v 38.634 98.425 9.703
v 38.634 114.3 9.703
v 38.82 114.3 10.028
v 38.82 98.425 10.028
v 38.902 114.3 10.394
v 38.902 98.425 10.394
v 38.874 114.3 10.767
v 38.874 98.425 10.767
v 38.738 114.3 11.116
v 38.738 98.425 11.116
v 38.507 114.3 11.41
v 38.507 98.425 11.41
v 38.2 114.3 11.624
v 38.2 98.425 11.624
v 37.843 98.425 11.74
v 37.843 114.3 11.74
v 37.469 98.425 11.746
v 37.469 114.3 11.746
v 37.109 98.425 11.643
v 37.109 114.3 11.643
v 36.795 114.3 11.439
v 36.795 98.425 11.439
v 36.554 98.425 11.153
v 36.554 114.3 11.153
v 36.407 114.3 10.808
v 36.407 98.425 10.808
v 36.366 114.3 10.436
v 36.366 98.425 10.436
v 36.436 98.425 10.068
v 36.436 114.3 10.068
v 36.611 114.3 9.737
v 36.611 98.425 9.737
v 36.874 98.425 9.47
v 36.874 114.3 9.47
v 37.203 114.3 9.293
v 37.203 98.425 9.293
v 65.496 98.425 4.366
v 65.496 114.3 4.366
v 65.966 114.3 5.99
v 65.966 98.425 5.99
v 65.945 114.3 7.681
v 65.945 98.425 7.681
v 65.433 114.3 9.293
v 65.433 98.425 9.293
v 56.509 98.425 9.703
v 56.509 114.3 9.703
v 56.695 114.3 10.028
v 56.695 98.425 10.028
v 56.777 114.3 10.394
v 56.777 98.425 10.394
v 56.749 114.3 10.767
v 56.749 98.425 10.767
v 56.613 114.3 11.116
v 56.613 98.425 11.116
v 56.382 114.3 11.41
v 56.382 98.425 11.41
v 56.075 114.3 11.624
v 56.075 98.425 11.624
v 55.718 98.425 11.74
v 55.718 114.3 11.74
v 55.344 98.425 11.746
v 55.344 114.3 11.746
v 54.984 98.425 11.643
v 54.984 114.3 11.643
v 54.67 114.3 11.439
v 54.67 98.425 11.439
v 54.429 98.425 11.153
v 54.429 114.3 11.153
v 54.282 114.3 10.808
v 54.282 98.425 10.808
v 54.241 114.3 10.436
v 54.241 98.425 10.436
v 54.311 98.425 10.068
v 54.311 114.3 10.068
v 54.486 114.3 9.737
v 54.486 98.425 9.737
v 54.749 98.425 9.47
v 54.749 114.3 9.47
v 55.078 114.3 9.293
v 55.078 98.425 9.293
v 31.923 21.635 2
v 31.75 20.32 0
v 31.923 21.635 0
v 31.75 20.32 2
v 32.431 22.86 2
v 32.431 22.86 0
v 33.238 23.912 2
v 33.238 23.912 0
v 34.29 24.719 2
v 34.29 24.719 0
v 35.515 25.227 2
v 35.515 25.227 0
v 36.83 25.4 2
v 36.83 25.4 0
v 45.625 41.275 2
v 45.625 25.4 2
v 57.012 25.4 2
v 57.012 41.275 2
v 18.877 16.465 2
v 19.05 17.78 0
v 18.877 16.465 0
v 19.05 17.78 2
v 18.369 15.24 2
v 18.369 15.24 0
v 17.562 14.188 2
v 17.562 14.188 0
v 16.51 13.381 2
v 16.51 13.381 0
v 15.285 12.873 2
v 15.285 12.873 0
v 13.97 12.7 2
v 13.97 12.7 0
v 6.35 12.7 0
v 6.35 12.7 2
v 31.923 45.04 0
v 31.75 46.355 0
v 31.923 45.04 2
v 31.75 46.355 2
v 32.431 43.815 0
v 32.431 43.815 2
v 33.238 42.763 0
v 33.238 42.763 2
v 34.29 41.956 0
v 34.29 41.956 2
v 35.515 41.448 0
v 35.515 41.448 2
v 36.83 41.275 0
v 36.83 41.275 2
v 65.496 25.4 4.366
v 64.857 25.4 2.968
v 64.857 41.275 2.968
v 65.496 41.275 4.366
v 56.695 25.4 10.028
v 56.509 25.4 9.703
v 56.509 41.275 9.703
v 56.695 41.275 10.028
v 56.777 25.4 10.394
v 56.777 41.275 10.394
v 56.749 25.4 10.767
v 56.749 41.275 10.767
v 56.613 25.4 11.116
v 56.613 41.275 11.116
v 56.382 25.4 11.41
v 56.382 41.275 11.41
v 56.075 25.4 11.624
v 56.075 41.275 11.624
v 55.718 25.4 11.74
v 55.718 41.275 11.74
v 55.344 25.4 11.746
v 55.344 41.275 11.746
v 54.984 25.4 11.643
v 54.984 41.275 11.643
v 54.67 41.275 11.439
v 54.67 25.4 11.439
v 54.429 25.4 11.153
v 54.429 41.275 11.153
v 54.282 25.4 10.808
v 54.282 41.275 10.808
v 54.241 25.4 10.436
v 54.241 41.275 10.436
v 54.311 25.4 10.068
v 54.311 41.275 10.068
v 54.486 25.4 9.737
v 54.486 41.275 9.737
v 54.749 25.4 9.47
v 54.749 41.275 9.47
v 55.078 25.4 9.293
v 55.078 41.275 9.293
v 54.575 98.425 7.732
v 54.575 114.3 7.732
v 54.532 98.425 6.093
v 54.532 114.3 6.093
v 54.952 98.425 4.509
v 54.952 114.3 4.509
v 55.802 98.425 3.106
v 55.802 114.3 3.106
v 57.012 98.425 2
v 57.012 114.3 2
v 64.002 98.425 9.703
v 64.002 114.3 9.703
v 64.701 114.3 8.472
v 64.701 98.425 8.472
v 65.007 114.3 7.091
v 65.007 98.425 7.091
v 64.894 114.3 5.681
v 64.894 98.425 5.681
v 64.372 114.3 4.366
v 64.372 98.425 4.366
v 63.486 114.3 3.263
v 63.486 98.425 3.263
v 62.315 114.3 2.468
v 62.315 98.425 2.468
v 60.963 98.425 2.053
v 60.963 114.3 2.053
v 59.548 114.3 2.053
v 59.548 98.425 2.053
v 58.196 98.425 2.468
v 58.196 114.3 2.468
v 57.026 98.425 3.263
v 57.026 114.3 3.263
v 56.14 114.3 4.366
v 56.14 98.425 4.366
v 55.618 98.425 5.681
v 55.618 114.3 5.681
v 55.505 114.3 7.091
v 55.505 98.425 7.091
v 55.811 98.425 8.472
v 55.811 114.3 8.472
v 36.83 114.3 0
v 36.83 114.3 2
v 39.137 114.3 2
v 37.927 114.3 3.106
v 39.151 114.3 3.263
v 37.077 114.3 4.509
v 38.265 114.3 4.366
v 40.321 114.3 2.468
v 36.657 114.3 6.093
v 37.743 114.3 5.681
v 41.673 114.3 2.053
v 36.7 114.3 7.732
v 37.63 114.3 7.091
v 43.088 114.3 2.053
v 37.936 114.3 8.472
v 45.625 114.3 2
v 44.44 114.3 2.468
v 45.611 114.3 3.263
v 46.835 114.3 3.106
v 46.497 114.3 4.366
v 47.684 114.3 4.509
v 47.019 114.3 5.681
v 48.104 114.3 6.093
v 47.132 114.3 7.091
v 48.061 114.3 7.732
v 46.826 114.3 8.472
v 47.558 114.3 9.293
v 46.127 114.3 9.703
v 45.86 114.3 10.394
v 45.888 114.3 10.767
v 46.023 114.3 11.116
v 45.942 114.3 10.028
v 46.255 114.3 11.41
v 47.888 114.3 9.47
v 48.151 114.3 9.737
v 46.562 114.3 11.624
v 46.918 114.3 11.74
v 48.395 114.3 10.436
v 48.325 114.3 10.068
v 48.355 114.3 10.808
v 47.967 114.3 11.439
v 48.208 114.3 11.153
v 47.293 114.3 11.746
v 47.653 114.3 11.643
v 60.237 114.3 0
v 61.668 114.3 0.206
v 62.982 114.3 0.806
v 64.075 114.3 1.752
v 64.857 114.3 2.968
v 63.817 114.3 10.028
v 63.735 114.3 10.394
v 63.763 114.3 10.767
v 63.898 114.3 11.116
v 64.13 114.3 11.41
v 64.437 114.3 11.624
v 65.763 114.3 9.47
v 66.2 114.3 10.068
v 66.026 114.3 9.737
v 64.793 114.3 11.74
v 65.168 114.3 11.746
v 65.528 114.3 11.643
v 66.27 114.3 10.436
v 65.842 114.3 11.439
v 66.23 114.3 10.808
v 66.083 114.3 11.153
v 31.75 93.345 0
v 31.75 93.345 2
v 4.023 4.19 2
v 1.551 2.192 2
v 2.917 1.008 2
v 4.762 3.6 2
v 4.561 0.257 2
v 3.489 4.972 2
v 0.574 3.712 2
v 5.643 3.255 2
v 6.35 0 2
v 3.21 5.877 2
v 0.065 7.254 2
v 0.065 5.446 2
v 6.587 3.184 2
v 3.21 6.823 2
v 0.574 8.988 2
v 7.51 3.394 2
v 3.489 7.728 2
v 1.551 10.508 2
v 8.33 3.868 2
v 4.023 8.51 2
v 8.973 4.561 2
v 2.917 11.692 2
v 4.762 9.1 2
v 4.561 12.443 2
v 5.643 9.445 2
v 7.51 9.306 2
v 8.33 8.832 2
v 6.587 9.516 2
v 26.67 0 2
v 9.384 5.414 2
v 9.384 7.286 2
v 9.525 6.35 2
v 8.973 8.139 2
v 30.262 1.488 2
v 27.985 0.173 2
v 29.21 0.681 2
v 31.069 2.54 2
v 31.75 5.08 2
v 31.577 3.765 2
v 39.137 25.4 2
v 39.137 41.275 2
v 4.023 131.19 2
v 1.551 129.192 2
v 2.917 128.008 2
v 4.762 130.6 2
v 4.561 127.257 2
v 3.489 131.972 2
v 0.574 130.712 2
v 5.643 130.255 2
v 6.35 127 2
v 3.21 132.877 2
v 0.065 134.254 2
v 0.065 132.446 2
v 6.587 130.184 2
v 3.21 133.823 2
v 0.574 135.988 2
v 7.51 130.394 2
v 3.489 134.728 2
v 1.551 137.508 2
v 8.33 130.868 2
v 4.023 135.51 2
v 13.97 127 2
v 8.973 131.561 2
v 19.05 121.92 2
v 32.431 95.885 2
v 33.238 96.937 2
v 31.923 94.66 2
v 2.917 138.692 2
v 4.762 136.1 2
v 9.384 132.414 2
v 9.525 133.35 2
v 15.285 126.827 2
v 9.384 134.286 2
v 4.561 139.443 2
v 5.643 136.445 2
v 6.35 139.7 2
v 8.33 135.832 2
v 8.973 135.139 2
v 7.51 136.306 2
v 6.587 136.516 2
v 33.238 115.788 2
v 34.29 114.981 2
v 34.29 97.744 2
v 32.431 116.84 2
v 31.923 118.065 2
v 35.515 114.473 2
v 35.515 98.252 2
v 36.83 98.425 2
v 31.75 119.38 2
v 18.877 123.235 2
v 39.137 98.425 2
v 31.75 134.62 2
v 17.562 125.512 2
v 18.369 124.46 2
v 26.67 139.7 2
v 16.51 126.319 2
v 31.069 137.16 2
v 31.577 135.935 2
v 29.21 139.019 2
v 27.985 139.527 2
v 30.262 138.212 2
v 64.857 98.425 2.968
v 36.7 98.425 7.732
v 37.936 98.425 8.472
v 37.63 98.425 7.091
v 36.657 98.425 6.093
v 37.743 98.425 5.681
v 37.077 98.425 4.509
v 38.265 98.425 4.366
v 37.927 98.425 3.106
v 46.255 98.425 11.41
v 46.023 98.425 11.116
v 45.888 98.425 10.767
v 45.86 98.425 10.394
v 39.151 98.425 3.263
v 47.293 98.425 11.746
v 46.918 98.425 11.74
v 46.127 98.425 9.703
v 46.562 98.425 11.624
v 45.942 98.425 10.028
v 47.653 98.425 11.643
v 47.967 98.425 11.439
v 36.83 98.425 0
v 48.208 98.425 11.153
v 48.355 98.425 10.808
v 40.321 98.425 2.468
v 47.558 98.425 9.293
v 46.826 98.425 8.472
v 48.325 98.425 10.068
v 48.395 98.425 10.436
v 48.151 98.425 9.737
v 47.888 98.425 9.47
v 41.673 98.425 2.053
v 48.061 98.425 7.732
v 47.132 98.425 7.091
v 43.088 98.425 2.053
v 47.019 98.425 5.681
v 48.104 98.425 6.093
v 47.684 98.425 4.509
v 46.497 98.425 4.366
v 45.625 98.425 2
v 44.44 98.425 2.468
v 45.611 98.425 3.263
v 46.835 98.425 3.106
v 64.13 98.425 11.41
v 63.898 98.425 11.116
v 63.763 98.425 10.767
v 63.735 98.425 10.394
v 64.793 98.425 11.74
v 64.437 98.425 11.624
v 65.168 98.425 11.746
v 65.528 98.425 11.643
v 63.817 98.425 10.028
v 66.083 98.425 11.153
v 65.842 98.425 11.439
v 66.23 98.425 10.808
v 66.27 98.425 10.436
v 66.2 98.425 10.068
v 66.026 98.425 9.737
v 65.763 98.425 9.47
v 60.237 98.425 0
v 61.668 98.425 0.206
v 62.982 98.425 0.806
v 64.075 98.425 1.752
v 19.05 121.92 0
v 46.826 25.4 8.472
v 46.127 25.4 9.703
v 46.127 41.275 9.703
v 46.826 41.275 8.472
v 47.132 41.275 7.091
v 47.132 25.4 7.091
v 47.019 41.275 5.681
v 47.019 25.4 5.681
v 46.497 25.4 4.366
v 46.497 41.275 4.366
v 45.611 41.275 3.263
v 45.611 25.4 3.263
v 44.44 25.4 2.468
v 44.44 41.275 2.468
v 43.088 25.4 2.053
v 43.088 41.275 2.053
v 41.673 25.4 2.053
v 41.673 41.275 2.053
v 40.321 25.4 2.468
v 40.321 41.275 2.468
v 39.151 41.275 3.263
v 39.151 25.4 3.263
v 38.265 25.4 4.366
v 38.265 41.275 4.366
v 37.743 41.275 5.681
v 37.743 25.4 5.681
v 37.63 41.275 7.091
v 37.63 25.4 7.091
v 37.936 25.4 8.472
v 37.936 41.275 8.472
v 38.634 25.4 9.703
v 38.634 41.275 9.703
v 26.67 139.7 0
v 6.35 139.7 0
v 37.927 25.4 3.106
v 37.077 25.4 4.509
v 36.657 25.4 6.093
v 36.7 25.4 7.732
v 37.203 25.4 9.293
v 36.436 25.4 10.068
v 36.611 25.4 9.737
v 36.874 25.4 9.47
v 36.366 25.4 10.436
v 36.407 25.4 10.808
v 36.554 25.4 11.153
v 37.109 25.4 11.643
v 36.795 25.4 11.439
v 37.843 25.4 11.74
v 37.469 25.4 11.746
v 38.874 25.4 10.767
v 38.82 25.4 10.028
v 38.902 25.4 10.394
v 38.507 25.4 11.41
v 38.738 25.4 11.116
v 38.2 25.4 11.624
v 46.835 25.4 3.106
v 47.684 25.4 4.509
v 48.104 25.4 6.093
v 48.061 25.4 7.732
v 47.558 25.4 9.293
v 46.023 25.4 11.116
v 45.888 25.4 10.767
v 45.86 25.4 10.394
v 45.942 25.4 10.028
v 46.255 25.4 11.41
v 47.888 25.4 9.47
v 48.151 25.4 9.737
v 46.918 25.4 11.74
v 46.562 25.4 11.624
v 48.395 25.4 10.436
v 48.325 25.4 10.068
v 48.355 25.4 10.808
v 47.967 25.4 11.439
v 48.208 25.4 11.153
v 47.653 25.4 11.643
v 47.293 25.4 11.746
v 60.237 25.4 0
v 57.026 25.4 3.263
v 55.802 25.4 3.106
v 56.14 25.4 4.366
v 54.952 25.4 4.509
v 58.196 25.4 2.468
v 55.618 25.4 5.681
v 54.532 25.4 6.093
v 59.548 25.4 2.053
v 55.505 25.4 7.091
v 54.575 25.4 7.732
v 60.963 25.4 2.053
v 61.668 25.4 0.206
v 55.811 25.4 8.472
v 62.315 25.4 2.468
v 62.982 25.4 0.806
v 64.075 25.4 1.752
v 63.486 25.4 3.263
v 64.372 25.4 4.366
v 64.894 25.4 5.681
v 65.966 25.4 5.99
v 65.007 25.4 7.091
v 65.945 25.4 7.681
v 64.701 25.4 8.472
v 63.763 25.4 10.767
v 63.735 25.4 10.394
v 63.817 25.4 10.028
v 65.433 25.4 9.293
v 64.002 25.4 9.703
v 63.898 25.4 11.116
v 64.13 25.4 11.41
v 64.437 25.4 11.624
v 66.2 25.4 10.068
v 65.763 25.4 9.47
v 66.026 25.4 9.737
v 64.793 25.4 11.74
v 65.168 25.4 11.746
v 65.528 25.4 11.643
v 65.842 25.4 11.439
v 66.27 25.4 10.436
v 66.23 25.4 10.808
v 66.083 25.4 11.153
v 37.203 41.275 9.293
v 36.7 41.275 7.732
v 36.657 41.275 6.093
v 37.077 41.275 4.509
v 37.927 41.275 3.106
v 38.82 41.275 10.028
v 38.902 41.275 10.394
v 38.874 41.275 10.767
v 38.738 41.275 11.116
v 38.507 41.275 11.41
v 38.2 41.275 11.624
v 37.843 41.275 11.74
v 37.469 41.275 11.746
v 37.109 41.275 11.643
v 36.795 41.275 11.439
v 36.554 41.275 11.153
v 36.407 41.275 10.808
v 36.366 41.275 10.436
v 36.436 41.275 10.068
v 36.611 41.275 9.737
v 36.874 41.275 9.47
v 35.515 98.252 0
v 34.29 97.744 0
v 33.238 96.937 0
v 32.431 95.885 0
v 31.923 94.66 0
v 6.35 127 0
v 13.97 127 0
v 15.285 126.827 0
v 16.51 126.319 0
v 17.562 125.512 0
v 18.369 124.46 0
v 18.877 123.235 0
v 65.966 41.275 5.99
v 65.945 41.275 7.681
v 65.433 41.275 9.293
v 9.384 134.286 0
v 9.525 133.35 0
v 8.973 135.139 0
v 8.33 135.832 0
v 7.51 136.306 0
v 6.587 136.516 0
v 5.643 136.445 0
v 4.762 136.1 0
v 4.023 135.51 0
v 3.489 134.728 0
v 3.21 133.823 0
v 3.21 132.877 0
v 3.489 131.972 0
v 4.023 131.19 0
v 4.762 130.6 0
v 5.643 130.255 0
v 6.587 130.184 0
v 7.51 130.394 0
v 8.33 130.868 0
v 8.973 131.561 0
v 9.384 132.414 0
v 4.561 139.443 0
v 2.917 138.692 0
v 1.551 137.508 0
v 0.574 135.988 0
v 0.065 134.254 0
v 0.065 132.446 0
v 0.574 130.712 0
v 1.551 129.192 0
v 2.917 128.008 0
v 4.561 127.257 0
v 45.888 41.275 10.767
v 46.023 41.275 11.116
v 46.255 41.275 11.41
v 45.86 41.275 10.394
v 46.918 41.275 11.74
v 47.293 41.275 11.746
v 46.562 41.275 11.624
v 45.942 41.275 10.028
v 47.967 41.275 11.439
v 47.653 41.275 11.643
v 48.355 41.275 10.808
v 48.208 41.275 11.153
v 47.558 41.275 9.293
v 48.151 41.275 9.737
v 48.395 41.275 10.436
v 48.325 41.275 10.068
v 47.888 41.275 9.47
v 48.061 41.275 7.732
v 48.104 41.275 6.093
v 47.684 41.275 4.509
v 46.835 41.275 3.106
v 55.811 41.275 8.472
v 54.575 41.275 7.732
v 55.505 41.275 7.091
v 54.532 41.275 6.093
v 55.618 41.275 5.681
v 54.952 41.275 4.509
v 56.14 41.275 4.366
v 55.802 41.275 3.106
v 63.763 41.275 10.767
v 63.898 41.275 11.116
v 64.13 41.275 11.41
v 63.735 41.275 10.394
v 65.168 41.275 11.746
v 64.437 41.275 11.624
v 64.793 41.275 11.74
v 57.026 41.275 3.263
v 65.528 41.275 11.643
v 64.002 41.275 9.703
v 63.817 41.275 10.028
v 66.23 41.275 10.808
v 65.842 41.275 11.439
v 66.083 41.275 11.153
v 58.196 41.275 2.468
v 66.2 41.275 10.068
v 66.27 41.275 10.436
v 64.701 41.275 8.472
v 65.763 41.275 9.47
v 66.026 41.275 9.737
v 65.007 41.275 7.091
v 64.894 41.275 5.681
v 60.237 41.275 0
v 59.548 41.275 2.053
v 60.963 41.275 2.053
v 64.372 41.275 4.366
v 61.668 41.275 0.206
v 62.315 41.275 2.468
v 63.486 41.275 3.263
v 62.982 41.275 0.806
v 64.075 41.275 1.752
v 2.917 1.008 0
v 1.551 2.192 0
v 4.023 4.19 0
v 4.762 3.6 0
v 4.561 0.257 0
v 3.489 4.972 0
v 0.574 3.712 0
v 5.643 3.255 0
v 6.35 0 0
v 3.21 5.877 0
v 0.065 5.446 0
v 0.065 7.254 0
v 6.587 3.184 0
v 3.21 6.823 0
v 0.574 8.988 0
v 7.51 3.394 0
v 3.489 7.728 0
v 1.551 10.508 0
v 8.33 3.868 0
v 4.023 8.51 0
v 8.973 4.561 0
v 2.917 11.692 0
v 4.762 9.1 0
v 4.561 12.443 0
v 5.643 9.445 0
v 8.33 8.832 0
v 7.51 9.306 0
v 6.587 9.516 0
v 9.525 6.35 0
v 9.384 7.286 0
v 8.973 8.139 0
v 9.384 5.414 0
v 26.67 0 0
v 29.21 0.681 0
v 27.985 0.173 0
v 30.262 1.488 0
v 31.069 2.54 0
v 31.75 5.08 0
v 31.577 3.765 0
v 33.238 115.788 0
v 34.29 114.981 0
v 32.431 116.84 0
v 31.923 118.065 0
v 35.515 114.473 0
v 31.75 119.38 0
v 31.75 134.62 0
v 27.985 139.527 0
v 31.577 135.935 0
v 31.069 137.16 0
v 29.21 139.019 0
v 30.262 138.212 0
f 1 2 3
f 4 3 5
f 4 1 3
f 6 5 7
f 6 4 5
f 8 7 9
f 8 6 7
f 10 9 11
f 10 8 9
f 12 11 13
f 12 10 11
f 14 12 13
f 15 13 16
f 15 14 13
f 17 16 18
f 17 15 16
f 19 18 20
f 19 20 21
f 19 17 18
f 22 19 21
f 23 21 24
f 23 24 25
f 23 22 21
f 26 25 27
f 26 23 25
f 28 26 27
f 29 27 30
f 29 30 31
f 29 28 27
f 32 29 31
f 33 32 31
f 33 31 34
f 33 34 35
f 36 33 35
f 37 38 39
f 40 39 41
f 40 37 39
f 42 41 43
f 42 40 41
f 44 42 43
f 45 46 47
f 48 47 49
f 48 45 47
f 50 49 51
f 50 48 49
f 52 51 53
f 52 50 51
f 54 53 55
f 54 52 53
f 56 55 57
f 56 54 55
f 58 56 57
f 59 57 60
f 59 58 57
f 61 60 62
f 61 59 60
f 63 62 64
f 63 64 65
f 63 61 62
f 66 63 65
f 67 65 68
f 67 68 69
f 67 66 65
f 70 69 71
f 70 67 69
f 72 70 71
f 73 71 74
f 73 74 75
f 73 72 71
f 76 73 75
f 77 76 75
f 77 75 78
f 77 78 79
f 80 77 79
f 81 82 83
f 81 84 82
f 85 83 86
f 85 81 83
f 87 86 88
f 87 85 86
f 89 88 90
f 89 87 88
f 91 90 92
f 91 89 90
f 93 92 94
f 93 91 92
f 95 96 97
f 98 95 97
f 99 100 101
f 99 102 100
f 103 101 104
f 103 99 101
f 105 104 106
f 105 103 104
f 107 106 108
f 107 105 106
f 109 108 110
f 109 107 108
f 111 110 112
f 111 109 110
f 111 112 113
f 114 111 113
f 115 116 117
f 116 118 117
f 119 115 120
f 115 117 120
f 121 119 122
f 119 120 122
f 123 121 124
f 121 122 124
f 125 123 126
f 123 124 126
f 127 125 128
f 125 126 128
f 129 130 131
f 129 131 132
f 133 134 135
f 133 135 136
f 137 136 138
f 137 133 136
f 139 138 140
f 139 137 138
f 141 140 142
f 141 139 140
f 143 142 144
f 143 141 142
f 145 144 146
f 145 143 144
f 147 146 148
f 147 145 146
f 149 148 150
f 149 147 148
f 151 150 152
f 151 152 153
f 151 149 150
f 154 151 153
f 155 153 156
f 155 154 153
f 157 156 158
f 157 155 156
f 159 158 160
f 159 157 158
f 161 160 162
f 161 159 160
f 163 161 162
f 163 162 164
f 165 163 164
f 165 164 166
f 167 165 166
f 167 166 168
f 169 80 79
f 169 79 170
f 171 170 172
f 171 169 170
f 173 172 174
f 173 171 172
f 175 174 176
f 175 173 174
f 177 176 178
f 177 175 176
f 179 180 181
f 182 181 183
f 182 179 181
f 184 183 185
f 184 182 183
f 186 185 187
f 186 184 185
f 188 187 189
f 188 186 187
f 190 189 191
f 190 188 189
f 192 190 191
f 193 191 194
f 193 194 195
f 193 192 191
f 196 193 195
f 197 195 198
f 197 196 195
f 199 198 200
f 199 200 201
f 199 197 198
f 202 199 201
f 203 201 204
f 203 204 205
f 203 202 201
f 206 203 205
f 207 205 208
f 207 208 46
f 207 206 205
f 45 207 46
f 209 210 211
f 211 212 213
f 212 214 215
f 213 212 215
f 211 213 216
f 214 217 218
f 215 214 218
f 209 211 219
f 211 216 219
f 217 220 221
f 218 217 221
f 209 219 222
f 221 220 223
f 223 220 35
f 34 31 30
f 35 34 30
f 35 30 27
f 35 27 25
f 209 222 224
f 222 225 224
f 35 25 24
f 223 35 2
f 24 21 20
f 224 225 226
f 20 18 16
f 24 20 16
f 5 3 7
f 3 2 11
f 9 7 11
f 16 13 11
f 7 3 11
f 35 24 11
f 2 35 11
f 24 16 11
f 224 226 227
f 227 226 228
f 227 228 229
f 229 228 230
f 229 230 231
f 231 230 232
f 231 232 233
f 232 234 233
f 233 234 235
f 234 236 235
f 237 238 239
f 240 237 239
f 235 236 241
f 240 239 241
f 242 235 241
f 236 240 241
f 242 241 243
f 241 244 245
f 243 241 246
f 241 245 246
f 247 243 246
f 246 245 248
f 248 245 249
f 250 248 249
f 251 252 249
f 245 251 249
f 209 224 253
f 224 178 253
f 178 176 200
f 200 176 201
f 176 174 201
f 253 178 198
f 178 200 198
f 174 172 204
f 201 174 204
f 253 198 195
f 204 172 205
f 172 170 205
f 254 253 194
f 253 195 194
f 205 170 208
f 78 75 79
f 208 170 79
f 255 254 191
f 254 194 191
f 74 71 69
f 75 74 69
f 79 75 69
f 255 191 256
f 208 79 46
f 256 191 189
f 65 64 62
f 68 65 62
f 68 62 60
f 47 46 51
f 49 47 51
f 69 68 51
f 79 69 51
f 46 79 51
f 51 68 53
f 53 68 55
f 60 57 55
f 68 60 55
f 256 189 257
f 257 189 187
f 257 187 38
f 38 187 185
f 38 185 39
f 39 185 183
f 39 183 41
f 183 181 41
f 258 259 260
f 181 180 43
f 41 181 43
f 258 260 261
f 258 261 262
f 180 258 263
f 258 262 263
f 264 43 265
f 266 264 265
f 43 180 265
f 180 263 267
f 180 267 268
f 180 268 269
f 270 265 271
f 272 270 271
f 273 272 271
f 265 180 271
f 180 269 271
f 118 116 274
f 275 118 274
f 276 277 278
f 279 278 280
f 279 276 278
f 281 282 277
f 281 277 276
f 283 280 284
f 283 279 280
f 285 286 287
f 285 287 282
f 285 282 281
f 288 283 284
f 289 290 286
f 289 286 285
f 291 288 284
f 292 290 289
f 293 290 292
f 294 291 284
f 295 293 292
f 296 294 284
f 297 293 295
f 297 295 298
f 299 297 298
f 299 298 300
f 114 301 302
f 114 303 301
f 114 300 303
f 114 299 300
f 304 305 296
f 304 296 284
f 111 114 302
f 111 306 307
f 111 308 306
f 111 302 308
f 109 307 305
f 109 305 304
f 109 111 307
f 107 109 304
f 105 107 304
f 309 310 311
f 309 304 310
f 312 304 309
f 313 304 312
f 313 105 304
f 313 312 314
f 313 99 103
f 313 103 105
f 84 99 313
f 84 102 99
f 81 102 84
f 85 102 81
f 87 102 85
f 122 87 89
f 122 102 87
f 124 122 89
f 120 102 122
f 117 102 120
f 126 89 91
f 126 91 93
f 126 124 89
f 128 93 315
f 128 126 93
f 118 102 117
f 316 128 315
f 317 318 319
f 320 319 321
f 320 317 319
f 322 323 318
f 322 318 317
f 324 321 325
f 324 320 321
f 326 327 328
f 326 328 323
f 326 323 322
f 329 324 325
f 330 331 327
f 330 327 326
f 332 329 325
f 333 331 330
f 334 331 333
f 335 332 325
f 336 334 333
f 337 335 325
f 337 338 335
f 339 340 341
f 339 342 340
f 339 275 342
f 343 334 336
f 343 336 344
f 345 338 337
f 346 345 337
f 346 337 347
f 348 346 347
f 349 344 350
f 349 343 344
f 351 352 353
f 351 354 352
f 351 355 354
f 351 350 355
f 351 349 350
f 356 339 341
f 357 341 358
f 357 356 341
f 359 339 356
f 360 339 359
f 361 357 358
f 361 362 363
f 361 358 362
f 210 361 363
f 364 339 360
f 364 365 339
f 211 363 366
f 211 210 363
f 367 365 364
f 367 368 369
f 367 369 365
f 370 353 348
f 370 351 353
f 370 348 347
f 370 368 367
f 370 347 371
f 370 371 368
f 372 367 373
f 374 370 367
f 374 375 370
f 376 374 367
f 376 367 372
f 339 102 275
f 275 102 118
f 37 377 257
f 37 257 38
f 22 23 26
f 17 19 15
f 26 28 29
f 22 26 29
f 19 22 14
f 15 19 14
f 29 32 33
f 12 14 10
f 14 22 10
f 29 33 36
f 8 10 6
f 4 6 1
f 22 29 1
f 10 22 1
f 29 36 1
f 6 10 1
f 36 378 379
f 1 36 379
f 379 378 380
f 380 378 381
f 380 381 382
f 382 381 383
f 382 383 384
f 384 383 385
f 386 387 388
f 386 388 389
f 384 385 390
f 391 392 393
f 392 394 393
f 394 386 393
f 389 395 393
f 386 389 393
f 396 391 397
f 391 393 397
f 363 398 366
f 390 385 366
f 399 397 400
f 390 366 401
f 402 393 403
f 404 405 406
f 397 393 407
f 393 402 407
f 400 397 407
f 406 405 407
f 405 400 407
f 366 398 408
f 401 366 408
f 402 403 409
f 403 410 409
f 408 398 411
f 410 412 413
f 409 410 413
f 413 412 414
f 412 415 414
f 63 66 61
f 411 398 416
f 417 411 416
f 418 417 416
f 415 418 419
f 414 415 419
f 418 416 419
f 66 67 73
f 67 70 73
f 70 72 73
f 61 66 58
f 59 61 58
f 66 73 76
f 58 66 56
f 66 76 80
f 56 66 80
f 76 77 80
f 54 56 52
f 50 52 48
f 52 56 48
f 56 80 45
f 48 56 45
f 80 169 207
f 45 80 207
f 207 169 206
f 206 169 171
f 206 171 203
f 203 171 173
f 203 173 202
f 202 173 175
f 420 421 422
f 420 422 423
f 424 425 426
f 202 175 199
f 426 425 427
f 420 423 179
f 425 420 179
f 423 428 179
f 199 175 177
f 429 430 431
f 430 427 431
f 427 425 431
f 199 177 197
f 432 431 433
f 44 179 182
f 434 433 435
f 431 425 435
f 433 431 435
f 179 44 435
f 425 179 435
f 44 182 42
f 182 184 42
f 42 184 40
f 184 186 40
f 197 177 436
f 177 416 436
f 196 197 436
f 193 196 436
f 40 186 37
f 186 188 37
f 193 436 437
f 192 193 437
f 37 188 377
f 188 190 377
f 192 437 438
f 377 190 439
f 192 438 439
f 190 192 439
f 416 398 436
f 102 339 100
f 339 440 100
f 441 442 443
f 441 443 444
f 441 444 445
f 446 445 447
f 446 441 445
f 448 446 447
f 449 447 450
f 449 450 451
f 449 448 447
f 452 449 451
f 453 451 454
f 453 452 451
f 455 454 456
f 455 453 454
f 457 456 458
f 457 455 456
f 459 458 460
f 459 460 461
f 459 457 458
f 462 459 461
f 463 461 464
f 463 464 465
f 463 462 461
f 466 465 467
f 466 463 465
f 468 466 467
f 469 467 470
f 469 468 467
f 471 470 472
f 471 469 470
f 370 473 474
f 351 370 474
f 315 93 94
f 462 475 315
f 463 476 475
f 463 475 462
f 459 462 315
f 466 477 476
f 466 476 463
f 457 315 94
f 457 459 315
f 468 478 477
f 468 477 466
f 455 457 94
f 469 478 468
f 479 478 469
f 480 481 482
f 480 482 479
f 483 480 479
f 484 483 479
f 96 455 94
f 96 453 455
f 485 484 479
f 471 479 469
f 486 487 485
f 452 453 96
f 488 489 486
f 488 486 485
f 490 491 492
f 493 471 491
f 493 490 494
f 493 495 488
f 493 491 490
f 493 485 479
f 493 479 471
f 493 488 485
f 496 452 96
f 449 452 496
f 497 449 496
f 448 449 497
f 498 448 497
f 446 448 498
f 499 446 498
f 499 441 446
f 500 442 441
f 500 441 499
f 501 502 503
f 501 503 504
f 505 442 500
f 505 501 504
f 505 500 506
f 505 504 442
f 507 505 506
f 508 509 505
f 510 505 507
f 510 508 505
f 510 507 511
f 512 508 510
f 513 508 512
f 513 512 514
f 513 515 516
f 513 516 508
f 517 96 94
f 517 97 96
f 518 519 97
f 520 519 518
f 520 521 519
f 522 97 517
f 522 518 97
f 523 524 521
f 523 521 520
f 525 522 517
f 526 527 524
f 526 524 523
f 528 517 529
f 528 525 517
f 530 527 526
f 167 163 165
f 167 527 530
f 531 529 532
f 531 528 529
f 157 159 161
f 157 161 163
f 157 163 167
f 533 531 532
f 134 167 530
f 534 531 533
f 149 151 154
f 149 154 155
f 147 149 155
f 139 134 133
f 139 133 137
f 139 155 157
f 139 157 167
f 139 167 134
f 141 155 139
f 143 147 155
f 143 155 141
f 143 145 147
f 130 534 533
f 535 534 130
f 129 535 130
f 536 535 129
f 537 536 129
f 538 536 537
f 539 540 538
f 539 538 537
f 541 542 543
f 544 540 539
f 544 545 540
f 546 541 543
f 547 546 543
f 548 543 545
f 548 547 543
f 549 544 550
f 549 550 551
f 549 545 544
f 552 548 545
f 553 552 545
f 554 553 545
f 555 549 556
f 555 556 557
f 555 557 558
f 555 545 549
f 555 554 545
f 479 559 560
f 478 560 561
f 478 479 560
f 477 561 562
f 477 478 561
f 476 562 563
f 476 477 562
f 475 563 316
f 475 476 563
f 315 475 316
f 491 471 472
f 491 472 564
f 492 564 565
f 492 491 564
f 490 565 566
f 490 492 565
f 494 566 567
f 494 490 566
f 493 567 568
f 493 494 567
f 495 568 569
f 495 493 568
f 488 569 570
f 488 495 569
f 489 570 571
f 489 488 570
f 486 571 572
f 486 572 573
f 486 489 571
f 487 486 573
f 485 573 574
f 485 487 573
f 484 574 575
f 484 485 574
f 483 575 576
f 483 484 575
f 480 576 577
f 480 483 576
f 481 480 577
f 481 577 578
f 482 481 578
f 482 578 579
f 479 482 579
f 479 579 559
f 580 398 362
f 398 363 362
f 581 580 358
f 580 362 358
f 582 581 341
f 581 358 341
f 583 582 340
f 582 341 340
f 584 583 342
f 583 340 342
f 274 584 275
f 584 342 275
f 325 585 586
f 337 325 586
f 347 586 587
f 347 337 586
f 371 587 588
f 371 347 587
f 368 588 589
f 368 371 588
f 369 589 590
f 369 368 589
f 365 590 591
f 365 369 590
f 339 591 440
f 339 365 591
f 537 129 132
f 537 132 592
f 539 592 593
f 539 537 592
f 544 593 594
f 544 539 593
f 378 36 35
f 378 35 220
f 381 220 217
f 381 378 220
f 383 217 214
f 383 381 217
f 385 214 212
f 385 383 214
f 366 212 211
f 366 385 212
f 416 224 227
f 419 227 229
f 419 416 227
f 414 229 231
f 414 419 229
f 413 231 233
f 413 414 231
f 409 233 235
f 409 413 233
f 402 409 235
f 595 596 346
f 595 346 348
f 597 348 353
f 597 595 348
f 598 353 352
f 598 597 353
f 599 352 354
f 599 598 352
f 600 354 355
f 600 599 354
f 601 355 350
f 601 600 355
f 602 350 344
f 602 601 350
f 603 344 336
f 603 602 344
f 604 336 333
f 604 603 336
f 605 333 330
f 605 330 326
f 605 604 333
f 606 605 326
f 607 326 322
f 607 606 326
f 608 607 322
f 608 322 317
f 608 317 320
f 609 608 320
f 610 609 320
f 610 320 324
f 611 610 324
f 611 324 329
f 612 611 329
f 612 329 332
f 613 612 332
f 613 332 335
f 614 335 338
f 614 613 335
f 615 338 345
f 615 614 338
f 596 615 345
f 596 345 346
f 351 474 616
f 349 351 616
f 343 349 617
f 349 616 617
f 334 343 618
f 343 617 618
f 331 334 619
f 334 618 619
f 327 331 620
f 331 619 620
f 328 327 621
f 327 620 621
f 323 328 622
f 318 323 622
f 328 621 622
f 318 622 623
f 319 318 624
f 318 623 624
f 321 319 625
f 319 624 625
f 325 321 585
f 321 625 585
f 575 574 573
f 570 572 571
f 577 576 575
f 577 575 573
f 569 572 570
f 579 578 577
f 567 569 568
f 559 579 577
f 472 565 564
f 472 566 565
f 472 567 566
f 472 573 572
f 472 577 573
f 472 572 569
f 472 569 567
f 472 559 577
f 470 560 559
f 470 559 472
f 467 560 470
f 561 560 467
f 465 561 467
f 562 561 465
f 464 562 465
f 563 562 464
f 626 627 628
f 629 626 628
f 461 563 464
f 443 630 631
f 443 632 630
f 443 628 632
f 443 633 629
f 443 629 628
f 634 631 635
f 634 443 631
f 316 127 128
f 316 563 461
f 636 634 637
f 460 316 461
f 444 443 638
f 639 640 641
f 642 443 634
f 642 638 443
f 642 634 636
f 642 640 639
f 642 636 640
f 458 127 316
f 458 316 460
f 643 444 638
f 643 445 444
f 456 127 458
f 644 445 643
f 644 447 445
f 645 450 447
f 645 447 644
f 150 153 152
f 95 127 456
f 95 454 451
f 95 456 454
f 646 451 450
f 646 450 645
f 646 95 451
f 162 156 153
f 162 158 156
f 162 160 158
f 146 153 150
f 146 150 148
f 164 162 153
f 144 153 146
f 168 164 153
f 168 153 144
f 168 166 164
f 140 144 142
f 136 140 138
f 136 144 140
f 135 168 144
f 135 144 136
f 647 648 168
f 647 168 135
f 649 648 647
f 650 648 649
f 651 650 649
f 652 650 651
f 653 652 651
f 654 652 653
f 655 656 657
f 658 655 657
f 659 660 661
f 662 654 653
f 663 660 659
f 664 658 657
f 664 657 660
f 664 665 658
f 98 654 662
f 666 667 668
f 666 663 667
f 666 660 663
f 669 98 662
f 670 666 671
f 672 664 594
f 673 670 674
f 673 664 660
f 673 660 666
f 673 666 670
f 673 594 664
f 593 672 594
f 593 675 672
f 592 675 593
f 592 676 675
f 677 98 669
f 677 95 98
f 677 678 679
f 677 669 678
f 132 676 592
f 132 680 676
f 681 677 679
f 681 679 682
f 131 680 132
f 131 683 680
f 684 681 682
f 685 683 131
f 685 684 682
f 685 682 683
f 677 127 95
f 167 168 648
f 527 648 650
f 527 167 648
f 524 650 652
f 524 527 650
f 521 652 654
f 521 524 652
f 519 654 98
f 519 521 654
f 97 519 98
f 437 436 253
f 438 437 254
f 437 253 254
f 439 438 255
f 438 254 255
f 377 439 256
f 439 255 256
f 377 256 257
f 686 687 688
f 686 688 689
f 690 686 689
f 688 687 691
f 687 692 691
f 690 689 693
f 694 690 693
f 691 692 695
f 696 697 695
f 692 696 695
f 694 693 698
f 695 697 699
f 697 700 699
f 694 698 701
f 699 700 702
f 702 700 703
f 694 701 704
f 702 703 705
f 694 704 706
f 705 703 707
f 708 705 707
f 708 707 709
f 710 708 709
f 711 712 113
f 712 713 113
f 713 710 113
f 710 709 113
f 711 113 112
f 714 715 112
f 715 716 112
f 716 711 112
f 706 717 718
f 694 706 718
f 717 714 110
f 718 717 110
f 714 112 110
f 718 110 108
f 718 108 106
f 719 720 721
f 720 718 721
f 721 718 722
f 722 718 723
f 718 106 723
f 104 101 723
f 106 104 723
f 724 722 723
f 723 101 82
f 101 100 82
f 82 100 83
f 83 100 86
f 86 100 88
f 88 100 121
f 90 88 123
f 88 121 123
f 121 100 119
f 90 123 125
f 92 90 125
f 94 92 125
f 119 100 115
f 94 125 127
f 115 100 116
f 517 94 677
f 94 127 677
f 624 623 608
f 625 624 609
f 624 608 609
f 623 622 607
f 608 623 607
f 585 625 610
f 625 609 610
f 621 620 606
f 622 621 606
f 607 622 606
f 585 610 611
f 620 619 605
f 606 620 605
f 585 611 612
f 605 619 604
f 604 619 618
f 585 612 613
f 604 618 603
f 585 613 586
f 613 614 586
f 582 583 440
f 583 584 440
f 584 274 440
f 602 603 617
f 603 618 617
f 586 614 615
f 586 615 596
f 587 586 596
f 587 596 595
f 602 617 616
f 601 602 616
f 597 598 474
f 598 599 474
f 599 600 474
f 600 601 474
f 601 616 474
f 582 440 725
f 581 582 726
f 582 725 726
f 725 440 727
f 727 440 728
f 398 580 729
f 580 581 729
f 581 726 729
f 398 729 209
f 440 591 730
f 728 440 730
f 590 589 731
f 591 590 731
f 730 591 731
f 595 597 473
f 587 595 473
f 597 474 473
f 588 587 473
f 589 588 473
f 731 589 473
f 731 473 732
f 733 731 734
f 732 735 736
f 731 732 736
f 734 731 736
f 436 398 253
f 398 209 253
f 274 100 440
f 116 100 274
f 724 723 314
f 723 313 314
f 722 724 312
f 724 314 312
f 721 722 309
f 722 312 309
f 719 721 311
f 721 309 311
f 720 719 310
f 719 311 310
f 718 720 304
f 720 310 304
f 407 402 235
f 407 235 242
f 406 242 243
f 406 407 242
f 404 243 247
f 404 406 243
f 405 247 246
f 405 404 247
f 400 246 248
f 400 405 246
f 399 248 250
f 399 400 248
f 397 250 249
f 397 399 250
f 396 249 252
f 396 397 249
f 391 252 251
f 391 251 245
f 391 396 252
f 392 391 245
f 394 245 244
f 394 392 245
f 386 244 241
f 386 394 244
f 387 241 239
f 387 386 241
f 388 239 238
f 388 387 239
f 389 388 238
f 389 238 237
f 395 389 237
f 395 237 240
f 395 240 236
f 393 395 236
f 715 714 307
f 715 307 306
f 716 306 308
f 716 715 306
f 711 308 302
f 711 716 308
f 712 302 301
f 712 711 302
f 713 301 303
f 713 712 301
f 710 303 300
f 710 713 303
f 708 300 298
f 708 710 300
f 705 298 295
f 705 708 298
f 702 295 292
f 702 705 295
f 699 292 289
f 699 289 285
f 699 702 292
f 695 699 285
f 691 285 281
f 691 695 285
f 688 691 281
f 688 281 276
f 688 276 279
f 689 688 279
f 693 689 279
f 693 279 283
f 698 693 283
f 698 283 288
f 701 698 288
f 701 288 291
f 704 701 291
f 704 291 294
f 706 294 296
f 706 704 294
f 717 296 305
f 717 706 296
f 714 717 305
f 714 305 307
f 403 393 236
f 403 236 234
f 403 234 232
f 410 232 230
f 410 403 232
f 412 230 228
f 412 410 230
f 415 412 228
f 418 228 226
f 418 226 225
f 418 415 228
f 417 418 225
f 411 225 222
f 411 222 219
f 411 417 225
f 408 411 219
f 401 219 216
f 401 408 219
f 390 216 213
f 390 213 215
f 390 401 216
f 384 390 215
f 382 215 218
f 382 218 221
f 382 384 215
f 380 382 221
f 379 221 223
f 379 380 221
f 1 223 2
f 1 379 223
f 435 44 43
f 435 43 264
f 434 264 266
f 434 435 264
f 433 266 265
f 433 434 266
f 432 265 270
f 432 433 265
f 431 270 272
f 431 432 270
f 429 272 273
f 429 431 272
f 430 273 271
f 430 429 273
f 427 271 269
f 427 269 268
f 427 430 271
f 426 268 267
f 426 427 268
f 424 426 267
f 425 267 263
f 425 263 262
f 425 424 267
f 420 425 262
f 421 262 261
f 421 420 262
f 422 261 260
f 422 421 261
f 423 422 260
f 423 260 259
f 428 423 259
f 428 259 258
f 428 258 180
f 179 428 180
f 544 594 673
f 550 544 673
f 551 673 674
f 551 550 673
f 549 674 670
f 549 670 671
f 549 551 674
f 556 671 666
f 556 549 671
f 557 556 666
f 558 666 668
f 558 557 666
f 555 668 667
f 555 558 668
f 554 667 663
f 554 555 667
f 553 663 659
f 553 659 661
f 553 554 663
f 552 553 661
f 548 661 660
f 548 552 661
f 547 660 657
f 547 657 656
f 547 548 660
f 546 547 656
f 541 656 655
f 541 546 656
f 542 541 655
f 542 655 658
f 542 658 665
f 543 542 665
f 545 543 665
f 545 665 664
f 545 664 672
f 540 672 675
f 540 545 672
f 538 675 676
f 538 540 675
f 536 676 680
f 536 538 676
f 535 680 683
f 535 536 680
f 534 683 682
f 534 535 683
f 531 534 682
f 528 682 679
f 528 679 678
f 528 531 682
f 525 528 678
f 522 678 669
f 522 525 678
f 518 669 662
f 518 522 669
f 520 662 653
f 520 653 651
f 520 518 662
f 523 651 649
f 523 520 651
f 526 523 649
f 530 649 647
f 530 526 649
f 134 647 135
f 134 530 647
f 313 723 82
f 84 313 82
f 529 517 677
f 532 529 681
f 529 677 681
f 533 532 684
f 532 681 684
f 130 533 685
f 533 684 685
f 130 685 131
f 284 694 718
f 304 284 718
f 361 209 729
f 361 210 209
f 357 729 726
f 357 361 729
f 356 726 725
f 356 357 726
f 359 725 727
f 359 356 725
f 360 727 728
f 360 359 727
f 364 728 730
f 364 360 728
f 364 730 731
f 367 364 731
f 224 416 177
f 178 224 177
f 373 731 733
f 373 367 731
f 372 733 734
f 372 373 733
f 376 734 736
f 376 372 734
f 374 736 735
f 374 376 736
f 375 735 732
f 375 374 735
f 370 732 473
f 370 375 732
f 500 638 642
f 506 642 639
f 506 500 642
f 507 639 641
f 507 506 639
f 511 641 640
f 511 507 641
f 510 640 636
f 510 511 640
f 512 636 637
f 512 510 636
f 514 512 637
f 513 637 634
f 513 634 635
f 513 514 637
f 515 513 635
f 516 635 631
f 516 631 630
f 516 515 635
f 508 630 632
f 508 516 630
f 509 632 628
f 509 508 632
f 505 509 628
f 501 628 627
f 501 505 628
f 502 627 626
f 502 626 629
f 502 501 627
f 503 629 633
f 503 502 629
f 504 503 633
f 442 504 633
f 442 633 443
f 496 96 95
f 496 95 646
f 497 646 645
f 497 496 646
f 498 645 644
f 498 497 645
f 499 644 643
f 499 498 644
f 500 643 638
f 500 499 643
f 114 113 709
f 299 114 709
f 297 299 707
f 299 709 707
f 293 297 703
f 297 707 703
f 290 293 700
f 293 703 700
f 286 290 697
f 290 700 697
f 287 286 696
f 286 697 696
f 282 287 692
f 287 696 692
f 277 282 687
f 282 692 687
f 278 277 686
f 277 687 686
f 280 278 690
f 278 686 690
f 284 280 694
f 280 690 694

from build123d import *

# Parameters (mm, degrees)
F0_R      = 3.175
F1_DEPTH  = 2
F3_DEPTH  = 88.9
F5_DEPTH  = 88.9
F6_W      = 44.45
F6_H      = 57.15
F7_DEPTH  = 25.4
F8_W      = 44.45
F8_H      = 57.15
F9_DEPTH  = 25.4
F10_R     = 4.7625
F11_DEPTH = 88.9
F12_R     = 5.08
F13_R     = 5.08


with BuildPart() as f1:
    # F0 (on Top) → F1 (new body)
    with BuildSketch(Plane.XY):
        with BuildLine():
            ThreePointArc((6.35, 12.7), (0, 6.35), (6.35, 0))
            Line((6.35, 0), (31.75, 0))
            Line((31.75, 0), (31.75, 25.4))
            Line((31.75, 25.4), (63.5, 25.4))
            Line((63.5, 25.4), (63.5, 41.275))
            Line((63.5, 41.275), (31.75, 41.275))
            Line((31.75, 41.275), (31.75, 98.425))
            Line((31.75, 98.425), (63.5, 98.425))
            Line((63.5, 98.425), (63.5, 114.3))
            Line((63.5, 114.3), (31.75, 114.3))
            Line((31.75, 114.3), (31.75, 139.7))
            Line((31.75, 139.7), (6.35, 139.7))
            ThreePointArc((6.35, 139.7), (0, 133.35), (6.35, 127))
            Line((6.35, 127), (19.05, 127))
            Line((19.05, 127), (19.05, 12.7))
            Line((19.05, 12.7), (6.35, 12.7))
        make_face()
        with Locations((6.35, 6.35)):
            Circle(F0_R, mode=Mode.SUBTRACT)
        with Locations((6.35, 133.35)):
            Circle(F0_R, mode=Mode.SUBTRACT)
    extrude(amount=F1_DEPTH)

    # F2 (on face) → F3 (join, through all)
    with BuildSketch(Plane.XZ.offset(-25.4)):
        with BuildLine():
            ThreePointArc((56.5092743605, 9.7027625733), (55.1601848792, 11.7076454488), (55.0783732507, 9.2925047427))
            ThreePointArc((55.0783732507, 9.2925047427), (60.2557743605, 1), (65.4331754703, 9.2925047427))
            ThreePointArc((65.4331754703, 9.2925047427), (65.3513638418, 11.7076454488), (64.0022743605, 9.7027625733))
            ThreePointArc((64.0022743605, 9.7027625733), (60.2557743605, 2), (56.5092743605, 9.7027625733))
        make_face()
        with BuildLine():
            ThreePointArc((46.1272743605, 9.7027625733), (42.3807743605, 2), (38.6342743605, 9.7027625733))
            ThreePointArc((38.6342743605, 9.7027625733), (37.2851848792, 11.7076454488), (37.2033732507, 9.2925047427))
            ThreePointArc((37.2033732507, 9.2925047427), (42.3807743605, 1), (47.5581754703, 9.2925047427))
            ThreePointArc((47.5581754703, 9.2925047427), (47.4763638418, 11.7076454488), (46.1272743605, 9.7027625733))
        make_face()
    extrude(amount=-F3_DEPTH)

    # F4 (on face) → F5 (join, through all)
    with BuildSketch(Plane.XZ.offset(-25.4)):
        Polygon((63.5, 0), (65.4964292905, 4.3662650043), (63.5, 2), align=None)
    extrude(amount=-F5_DEPTH)

    # F6 (on face) → F7 (cut)
    with BuildSketch(Plane(origin=(0, 0, 0), x_dir=(1, 0, 0), z_dir=(0, 0, -1))):
        with Locations((53.975, -69.85)):
            Rectangle(F6_W, F6_H)
    extrude(amount=-F7_DEPTH, mode=Mode.SUBTRACT)

    # F8 (on face) → F9 (cut)
    with BuildSketch(Plane.XY.offset(2)):
        with Locations((41.275, 69.85)):
            Rectangle(F8_W, F8_H)
    extrude(amount=F9_DEPTH, mode=Mode.SUBTRACT)

    # F10 (on face) → F11 (cut, through all)
    with BuildSketch(Plane.XZ.offset(-25.4)):
        with Locations((42.3807743605, 6.7625)):
            Circle(F10_R)
        with Locations((60.2557743605, 6.7625)):
            Circle(F10_R)
    extrude(amount=-F11_DEPTH, mode=Mode.SUBTRACT)

    # F12
    f12_edges = [f1.edges().sort_by_distance(p)[0] for p in [
        (31.75, 0, 1),
        (31.75, 25.4, 1),
        (31.75, 41.275, 1),
        (31.75, 98.425, 1),
        (31.75, 114.3, 1),
        (31.75, 139.7, 1),
        (19.05, 127, 1),
        (19.05, 12.7, 1),
    ]]
    fillet(f12_edges, radius=F12_R)

    # F13
    f13_edges = [f1.edges().sort_by_distance(p)[0] for p in [
        (63.5, 33.3375, 0),
        (63.5, 106.3625, 0),
    ]]
    fillet(f13_edges, radius=F13_R)


solid = f1.part
